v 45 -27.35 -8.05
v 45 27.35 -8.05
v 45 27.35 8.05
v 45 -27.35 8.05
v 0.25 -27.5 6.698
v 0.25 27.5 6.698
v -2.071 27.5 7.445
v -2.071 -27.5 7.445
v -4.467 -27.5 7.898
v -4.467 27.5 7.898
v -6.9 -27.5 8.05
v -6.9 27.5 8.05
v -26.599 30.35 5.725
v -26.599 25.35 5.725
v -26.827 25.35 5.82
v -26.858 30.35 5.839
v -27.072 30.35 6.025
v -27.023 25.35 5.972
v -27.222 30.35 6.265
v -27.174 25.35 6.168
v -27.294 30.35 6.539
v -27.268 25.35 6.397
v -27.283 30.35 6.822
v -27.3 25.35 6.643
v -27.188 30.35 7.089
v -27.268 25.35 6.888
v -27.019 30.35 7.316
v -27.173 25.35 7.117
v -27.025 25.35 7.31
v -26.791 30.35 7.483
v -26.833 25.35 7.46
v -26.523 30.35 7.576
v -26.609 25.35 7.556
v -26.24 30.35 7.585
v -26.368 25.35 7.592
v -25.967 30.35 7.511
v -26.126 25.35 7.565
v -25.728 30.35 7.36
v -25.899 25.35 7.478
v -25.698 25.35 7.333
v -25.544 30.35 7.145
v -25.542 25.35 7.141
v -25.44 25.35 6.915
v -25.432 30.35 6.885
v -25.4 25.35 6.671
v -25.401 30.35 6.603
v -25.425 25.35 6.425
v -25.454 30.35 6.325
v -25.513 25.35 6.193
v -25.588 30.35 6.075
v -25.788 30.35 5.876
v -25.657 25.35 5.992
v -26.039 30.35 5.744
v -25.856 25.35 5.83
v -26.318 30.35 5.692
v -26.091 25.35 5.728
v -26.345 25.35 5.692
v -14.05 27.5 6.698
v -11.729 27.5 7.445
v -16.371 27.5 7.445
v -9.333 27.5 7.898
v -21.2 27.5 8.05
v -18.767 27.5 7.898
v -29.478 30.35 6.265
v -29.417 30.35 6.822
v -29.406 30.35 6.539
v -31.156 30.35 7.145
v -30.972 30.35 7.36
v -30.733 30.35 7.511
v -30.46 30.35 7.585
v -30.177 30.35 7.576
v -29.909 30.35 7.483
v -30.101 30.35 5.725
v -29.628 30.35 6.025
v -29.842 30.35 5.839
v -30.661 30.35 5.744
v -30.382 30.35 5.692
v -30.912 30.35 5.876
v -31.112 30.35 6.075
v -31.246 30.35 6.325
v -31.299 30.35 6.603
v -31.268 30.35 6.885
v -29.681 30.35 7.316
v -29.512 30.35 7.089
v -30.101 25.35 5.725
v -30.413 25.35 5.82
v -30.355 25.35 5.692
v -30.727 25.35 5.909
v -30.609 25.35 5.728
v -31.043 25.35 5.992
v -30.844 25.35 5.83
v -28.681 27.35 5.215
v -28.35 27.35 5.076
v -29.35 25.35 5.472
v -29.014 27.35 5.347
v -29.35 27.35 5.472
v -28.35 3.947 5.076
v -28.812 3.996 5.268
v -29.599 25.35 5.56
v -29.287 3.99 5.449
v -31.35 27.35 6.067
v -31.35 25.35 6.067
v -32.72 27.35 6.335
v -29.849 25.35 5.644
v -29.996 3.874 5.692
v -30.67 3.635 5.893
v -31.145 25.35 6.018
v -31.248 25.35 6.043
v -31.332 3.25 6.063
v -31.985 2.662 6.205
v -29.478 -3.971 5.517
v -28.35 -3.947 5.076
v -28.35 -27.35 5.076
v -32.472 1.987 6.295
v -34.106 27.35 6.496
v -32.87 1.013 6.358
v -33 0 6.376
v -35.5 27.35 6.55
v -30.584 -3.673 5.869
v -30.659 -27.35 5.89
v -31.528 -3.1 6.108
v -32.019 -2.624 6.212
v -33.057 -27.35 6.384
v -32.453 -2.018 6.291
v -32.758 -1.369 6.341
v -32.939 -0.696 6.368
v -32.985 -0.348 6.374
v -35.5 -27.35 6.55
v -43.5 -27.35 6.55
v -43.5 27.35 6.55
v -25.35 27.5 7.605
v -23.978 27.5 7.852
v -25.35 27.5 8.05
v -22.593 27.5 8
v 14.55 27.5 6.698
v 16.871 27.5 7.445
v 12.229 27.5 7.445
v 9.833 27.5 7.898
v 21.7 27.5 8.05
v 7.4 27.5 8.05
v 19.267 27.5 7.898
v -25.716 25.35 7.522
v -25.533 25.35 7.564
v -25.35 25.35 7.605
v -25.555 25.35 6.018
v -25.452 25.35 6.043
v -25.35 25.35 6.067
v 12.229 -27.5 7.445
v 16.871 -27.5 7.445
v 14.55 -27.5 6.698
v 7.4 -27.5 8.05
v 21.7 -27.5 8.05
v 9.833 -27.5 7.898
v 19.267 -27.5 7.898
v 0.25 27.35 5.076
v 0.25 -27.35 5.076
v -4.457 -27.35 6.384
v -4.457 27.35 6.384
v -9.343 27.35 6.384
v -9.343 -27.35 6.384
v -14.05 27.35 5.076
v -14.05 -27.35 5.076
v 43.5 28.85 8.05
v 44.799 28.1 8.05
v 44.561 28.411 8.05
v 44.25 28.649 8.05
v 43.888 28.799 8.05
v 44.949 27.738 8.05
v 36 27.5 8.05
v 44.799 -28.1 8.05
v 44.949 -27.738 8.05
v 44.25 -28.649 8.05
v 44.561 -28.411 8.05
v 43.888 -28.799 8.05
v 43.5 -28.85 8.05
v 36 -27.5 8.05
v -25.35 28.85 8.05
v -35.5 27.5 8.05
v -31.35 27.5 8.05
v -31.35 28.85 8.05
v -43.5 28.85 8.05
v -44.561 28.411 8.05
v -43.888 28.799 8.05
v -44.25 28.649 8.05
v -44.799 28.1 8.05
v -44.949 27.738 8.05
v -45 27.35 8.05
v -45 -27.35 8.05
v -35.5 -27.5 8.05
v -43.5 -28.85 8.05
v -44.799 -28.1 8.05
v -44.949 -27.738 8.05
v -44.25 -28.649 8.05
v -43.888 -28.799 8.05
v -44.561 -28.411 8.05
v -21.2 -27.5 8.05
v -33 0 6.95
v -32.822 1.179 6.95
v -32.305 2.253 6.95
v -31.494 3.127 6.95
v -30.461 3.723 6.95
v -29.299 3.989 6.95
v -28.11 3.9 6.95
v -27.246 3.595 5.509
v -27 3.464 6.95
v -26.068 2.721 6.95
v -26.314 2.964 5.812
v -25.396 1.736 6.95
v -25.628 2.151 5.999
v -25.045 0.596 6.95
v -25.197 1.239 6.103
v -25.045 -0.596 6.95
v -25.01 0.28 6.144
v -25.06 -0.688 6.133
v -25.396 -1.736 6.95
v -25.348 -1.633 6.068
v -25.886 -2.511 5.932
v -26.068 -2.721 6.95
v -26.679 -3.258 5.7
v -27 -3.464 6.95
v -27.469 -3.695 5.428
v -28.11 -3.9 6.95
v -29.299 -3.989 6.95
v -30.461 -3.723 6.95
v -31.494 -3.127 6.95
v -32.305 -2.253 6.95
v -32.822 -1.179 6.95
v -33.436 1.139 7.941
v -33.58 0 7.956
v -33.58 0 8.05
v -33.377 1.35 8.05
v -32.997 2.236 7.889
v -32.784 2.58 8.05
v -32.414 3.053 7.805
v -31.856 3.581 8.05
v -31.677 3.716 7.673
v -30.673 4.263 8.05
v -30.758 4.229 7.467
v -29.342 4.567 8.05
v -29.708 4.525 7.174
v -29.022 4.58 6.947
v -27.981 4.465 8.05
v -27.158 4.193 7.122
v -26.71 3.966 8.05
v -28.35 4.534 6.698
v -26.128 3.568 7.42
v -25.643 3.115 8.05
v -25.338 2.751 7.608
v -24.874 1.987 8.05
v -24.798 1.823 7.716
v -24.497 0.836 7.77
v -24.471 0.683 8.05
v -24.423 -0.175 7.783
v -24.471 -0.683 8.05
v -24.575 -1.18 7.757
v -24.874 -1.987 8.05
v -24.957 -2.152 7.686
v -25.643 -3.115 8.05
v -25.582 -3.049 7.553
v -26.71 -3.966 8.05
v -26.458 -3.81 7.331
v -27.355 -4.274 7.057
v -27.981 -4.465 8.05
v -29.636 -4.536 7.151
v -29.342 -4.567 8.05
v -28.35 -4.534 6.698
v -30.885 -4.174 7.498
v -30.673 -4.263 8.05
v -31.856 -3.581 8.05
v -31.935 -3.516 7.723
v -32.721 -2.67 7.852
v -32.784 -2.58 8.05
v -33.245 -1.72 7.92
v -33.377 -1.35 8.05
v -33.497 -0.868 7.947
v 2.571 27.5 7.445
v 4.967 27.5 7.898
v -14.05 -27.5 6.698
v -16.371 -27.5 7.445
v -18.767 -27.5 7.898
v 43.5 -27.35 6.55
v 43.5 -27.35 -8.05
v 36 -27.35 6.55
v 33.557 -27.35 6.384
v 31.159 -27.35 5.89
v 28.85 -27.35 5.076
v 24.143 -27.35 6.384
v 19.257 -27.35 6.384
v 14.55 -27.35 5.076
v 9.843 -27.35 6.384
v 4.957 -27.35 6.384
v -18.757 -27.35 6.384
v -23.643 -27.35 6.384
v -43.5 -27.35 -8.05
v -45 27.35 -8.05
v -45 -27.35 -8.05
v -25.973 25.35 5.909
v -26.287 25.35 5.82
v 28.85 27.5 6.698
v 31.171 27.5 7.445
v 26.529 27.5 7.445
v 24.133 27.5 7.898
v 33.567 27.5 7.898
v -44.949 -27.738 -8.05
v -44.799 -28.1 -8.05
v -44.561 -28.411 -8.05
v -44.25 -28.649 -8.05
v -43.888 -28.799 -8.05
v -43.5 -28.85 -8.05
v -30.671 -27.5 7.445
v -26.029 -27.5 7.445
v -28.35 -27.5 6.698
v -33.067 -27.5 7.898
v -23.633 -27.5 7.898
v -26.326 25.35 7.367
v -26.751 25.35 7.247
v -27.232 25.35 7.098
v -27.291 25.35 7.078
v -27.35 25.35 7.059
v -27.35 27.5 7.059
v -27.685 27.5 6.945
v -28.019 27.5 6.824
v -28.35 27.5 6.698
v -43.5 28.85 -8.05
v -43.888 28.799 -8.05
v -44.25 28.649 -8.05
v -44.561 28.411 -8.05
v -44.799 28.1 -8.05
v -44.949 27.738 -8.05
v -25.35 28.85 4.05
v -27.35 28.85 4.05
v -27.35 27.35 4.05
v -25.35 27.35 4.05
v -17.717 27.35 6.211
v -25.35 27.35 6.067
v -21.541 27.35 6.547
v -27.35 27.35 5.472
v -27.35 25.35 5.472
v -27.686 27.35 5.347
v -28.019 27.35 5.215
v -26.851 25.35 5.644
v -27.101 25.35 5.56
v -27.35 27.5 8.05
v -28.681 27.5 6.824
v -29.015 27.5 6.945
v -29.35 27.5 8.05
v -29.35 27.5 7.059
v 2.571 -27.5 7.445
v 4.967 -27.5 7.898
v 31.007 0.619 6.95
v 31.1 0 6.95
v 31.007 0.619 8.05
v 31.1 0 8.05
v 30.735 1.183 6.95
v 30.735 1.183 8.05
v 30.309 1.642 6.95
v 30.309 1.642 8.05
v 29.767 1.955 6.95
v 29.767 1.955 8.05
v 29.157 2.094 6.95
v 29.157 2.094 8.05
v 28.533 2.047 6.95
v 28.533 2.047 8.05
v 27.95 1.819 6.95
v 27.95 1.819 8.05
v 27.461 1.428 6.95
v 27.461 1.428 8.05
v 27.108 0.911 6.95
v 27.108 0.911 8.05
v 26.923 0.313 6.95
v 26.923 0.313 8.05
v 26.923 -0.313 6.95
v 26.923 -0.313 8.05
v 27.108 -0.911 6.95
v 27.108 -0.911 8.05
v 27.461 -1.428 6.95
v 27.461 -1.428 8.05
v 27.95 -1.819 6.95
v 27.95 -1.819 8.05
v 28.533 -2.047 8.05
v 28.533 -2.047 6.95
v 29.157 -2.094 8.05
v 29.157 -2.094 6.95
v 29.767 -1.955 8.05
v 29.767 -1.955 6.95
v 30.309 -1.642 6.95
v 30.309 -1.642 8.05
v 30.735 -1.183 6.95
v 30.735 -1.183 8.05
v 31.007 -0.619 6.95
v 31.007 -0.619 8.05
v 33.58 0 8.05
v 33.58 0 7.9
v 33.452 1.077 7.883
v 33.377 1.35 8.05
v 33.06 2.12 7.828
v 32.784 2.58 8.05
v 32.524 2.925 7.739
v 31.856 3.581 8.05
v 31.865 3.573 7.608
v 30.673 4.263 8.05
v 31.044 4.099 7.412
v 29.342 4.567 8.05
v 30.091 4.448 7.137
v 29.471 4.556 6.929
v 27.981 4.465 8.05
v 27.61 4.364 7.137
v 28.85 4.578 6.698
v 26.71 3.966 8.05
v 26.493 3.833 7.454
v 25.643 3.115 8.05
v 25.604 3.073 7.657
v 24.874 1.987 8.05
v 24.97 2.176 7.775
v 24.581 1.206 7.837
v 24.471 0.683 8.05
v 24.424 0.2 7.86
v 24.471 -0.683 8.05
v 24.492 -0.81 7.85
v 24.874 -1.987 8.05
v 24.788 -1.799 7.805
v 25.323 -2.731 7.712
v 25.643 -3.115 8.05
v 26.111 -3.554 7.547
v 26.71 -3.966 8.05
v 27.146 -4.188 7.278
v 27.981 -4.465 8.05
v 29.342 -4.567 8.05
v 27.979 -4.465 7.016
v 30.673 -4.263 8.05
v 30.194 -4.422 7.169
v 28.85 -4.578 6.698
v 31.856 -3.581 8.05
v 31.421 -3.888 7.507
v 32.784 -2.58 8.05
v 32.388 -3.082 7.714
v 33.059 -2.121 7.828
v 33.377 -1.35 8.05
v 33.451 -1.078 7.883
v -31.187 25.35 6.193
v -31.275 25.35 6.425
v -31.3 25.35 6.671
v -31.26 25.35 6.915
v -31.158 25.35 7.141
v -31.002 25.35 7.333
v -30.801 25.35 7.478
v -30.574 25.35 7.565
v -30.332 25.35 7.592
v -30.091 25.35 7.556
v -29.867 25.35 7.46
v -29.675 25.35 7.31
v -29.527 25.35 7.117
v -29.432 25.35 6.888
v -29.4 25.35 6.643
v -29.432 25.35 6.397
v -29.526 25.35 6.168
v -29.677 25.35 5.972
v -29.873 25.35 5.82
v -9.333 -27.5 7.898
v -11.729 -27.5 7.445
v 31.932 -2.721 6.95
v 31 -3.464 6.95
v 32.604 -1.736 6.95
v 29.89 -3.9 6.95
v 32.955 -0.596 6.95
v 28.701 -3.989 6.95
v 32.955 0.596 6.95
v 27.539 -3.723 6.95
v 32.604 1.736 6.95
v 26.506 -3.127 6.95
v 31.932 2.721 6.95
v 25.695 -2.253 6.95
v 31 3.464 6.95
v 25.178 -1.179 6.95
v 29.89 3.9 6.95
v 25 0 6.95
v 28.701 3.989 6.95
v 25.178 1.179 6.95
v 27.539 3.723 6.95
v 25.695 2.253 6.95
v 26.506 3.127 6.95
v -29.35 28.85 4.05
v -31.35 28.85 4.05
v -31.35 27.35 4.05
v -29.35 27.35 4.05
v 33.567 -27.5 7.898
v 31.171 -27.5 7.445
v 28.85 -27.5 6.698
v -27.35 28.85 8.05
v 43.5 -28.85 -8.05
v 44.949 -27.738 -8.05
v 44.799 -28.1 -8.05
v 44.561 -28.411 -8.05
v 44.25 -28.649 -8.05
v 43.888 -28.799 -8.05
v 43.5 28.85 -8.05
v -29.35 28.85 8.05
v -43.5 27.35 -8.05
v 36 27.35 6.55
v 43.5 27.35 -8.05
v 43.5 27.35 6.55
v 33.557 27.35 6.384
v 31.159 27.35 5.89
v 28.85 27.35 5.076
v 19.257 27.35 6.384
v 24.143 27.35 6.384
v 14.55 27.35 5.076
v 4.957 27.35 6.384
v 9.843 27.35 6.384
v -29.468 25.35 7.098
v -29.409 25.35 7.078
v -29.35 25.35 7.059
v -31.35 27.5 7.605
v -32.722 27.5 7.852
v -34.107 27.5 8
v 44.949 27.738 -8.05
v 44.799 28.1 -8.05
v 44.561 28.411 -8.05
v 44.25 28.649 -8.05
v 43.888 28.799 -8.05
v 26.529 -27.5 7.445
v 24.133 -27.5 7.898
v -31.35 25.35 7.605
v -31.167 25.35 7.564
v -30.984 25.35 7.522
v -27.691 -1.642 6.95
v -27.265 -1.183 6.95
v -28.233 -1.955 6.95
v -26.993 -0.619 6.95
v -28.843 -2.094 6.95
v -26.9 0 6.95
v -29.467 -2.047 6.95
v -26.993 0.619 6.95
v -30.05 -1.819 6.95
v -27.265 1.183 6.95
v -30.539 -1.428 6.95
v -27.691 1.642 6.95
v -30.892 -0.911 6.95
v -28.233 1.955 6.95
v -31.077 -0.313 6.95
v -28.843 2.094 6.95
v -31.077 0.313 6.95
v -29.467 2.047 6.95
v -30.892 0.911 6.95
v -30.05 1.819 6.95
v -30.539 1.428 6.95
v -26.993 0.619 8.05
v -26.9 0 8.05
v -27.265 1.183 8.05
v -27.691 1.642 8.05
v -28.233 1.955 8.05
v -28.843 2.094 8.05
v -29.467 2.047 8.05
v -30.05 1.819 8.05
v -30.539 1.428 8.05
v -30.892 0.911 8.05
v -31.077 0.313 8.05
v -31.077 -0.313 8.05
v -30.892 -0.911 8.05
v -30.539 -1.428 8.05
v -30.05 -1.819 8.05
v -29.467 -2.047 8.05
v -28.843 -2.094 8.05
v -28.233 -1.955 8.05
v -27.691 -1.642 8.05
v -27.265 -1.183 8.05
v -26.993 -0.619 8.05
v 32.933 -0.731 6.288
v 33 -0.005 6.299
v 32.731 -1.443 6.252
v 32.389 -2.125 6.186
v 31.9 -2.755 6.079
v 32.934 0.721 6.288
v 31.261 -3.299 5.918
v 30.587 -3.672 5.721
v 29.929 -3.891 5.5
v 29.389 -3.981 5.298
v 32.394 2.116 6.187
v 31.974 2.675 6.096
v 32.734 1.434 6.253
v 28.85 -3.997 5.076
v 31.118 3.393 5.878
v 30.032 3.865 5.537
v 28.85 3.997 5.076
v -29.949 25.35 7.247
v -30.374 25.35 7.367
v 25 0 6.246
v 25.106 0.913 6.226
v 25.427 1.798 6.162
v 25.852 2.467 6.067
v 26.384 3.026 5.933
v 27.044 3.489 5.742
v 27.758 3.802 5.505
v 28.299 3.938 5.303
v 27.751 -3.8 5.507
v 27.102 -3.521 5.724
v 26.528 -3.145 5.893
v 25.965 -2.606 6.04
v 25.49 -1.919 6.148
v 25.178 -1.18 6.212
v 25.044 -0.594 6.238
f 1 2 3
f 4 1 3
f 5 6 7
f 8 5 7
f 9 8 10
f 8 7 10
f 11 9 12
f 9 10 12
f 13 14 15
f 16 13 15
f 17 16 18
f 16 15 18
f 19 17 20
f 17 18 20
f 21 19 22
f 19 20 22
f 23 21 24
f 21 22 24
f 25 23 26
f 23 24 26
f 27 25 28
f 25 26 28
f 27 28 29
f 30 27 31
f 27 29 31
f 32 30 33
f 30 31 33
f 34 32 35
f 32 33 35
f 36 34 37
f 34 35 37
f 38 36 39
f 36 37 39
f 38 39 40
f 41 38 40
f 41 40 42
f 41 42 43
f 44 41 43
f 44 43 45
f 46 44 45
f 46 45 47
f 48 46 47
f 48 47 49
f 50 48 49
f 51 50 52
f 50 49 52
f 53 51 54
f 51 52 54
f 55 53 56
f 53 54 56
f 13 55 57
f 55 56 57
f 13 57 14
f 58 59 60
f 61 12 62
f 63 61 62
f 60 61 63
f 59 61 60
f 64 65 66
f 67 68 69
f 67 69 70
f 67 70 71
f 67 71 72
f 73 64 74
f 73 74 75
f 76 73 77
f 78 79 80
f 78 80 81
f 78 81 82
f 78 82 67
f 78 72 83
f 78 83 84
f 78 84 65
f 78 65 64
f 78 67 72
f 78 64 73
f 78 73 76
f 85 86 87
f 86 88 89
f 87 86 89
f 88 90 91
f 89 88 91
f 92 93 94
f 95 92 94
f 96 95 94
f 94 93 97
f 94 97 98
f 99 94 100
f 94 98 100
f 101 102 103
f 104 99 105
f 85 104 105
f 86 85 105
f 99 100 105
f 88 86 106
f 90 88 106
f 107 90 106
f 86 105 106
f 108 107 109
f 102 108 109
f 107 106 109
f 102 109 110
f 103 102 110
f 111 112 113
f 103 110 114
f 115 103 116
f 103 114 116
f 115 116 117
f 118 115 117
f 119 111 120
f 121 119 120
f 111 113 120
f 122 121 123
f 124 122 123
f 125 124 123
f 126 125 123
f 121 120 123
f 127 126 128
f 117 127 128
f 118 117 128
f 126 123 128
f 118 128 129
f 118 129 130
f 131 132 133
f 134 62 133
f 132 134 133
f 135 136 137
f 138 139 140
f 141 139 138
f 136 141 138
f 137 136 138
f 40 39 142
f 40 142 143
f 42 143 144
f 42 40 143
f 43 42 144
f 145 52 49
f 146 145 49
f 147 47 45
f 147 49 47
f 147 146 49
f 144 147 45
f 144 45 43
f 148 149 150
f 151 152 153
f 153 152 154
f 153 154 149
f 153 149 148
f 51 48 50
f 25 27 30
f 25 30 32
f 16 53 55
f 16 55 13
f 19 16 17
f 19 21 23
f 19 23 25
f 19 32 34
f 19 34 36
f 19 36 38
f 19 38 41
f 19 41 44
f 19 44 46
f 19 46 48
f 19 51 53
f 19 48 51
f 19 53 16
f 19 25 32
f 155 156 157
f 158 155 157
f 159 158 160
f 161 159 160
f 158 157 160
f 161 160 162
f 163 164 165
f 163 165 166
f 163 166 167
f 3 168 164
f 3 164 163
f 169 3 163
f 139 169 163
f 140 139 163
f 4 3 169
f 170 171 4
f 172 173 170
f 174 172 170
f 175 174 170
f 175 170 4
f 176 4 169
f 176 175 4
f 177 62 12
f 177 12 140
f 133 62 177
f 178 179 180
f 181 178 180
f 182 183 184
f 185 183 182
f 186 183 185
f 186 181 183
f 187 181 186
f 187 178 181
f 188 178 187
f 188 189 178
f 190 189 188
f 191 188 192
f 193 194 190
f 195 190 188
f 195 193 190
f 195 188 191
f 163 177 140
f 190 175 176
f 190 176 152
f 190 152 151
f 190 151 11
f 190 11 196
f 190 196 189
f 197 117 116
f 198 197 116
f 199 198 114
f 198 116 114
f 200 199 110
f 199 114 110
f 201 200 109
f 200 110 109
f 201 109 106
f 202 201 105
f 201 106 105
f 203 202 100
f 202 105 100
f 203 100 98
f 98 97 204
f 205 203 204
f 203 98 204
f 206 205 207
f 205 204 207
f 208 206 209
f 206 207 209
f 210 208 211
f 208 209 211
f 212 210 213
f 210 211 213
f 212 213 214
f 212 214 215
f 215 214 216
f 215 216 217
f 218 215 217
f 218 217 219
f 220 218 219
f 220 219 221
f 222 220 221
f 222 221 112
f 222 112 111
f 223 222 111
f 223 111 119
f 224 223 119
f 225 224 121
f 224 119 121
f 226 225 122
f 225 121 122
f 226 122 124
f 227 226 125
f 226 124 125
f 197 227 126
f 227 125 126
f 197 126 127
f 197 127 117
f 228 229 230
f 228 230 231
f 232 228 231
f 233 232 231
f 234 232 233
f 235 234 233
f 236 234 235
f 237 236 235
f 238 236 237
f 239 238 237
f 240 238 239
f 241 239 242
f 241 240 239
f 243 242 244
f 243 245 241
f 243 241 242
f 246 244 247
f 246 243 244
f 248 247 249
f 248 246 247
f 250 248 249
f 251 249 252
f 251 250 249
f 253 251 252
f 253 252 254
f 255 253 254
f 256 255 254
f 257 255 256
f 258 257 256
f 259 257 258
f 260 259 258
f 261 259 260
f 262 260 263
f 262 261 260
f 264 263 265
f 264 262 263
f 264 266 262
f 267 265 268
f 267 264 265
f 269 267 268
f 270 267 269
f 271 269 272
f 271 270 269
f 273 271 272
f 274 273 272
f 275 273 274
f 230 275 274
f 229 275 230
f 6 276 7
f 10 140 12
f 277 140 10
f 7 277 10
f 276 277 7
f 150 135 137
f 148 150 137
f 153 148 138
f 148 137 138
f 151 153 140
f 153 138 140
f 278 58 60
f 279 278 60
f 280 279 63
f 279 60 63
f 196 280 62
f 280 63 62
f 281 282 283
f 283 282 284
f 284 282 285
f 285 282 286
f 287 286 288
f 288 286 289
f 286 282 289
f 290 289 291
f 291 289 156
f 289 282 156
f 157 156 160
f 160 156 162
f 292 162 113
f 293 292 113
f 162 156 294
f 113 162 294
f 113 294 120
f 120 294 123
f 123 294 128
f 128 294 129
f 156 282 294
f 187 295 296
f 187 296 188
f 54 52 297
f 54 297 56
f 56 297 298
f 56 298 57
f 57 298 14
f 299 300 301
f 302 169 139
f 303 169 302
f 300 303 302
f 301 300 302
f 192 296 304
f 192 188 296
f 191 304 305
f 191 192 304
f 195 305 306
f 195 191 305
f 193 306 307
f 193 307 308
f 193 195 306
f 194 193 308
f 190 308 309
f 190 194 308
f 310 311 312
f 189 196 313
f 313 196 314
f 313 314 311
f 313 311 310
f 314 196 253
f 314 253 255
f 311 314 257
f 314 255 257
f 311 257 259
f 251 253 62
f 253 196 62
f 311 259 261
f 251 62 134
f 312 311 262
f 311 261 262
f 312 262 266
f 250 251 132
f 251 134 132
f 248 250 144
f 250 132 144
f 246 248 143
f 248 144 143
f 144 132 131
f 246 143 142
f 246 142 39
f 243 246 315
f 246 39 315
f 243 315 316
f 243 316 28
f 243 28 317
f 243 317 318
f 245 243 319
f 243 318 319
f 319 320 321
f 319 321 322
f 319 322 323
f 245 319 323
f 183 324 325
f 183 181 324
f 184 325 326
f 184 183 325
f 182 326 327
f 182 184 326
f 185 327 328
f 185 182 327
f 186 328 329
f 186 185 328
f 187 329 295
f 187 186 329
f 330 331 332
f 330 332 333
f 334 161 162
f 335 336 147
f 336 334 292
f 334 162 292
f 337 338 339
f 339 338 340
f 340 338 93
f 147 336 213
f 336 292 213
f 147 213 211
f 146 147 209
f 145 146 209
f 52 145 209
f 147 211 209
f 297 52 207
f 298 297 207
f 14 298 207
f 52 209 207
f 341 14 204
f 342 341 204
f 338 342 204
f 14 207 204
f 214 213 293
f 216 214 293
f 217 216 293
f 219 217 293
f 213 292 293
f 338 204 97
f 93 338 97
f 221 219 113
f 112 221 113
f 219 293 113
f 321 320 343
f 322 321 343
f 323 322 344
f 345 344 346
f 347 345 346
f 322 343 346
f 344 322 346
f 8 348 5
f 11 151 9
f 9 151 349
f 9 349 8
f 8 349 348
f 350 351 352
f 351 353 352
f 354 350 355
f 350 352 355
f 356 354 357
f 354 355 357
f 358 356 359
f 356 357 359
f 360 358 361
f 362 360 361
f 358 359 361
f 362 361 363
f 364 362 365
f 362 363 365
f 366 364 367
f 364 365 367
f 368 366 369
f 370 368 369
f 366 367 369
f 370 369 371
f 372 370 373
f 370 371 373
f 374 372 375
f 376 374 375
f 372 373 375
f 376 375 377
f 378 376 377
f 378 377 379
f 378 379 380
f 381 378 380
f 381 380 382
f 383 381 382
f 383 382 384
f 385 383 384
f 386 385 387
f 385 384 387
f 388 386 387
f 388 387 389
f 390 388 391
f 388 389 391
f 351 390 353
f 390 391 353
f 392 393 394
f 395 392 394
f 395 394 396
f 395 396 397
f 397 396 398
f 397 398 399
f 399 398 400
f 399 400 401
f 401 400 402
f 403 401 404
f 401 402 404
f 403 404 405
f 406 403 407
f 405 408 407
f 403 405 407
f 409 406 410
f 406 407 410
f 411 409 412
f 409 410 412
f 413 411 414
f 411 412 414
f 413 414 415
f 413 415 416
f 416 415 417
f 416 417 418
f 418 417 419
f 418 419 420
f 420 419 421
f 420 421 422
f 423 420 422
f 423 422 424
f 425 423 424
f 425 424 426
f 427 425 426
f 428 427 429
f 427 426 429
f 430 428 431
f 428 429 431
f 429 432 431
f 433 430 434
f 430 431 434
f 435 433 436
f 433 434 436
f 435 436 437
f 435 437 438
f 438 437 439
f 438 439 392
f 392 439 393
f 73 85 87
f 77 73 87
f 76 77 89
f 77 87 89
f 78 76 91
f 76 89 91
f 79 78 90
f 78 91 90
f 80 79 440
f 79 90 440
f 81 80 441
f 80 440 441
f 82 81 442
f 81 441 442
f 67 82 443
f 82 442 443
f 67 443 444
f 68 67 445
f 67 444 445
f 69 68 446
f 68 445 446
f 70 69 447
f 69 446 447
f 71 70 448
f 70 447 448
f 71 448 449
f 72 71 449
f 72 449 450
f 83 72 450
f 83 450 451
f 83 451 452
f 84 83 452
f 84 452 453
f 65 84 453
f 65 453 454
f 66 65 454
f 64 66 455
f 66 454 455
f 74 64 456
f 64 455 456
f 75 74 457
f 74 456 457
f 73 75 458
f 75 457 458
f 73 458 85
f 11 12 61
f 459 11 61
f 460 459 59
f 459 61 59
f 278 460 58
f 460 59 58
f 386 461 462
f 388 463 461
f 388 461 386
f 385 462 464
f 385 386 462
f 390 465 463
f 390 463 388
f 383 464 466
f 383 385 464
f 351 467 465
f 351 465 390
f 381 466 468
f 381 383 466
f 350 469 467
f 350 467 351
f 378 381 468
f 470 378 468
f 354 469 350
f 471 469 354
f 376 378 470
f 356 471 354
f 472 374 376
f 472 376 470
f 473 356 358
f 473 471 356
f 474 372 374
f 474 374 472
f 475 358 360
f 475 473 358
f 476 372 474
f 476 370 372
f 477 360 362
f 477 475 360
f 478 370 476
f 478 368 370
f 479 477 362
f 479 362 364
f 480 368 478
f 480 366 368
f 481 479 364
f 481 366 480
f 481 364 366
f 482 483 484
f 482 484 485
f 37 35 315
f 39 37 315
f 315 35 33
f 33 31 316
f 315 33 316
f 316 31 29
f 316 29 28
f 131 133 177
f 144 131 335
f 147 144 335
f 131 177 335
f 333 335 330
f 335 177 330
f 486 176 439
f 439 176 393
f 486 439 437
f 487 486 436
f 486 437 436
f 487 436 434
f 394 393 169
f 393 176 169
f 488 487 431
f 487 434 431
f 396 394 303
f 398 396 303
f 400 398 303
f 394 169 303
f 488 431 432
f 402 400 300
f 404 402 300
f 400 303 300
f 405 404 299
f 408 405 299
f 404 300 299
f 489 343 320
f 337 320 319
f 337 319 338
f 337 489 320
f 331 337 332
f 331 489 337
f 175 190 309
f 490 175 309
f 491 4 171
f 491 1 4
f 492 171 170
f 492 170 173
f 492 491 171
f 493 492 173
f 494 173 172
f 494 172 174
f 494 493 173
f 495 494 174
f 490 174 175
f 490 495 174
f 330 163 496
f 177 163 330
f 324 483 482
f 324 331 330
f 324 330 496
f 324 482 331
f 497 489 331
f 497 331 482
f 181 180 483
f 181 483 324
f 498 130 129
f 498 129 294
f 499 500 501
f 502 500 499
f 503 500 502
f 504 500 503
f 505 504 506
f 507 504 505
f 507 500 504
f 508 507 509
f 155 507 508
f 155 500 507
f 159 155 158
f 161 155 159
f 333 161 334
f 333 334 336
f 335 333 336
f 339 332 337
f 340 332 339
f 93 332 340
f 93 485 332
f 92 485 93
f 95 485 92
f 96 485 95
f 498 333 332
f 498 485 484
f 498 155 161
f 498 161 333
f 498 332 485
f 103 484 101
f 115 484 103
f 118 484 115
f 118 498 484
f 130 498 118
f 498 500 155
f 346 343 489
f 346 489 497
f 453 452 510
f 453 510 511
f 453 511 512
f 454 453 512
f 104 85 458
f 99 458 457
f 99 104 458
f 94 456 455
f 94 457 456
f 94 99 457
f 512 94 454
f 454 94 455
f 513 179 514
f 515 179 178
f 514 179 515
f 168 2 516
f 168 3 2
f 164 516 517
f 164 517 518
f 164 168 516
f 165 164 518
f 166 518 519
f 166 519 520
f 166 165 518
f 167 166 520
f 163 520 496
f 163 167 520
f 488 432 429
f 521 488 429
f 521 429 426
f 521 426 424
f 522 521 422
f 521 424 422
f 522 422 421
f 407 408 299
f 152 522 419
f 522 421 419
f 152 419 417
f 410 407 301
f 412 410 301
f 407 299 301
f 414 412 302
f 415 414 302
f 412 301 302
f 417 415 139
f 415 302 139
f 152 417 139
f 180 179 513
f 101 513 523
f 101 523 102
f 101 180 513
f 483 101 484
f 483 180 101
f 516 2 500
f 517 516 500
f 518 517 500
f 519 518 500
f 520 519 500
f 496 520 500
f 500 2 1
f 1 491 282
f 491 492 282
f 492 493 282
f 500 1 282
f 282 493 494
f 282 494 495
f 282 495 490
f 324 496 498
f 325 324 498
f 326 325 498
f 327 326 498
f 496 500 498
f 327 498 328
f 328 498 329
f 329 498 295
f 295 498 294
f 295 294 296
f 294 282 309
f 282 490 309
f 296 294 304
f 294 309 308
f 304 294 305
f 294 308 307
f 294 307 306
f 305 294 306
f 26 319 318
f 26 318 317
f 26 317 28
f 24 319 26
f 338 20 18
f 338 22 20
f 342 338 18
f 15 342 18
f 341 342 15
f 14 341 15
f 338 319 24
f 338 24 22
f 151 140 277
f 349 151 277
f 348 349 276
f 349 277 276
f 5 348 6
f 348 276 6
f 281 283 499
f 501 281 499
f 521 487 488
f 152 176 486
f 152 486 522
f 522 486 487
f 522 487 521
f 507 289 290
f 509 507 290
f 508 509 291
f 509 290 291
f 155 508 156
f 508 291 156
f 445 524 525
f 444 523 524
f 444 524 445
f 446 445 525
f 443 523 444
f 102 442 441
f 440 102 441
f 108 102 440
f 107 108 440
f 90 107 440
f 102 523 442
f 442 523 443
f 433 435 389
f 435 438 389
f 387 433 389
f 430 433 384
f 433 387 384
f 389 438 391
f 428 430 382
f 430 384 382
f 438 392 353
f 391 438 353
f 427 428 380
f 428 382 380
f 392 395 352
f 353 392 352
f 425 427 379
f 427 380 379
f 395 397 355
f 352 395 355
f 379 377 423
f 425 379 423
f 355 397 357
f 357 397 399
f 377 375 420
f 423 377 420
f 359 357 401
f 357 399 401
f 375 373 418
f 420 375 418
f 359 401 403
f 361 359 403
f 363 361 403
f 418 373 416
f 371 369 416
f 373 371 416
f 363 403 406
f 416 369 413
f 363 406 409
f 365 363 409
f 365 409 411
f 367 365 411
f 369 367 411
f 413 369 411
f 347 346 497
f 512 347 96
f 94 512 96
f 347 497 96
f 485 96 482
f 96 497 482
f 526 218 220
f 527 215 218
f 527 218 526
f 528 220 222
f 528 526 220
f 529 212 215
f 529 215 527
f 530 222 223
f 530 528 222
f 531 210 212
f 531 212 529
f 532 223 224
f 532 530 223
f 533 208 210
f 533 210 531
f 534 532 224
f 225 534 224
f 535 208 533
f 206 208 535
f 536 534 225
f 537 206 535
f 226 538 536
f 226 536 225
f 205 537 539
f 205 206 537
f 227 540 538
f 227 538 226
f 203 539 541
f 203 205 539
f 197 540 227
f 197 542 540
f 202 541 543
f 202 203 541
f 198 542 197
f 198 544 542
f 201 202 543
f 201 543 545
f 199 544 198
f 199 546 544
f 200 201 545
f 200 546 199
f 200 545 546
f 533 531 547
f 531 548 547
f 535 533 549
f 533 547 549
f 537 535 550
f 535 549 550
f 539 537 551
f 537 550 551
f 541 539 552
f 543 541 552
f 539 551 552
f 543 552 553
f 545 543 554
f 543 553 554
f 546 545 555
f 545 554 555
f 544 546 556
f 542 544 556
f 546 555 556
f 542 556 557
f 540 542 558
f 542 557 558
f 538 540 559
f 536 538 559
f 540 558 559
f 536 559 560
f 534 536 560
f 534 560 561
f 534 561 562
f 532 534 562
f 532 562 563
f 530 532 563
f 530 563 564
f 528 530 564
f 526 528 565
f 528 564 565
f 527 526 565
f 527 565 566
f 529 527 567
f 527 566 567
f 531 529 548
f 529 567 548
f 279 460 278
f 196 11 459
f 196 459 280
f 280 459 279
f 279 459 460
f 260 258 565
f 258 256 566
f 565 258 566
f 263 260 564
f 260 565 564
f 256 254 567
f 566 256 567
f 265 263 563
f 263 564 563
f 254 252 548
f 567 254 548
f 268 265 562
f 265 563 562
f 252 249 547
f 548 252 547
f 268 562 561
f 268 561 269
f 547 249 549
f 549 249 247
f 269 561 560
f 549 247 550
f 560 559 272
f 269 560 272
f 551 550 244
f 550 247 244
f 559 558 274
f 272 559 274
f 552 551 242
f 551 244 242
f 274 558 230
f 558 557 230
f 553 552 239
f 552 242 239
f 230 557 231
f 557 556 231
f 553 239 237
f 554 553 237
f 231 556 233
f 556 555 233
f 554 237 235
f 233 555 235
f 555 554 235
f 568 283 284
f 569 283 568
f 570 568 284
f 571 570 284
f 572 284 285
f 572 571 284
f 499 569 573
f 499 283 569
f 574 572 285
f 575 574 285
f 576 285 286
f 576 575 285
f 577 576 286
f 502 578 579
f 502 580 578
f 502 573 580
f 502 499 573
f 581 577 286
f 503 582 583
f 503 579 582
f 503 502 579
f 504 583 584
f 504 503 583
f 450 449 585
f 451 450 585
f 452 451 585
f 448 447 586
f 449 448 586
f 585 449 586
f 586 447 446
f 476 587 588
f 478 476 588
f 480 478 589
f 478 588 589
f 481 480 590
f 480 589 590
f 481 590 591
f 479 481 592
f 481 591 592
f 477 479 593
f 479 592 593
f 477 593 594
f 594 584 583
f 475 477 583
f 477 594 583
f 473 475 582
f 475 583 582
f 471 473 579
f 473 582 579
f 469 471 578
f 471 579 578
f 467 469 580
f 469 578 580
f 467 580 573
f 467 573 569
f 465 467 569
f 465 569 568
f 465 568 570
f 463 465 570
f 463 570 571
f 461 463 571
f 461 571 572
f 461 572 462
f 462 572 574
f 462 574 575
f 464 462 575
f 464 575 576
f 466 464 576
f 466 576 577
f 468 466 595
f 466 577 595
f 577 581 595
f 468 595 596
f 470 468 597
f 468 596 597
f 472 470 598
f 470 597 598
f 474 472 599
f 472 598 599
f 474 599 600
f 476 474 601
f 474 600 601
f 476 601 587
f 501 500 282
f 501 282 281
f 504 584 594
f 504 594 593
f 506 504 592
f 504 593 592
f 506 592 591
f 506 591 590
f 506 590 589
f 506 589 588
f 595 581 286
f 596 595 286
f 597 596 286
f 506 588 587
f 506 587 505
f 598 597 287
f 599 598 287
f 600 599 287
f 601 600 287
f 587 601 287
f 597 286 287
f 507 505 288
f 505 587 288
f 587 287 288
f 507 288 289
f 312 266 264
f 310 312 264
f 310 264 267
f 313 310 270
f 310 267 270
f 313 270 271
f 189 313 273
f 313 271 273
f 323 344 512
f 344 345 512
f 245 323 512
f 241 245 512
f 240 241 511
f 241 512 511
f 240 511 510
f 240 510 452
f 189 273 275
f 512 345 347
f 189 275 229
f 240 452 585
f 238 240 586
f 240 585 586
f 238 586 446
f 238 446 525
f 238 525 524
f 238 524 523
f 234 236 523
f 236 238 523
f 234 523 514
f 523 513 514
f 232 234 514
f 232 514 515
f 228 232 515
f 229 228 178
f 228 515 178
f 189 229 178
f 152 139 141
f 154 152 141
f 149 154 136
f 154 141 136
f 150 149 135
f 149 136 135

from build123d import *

# Parameters (mm, degrees)
EXTRUDE_1_DEPTH                = 54.7
SKETCH_2_W                     = 1.5
SKETCH_2_H                     = 1.473886678
EXTRUDE_2_DEPTH                = 7.15
SKETCH_3_W                     = 0.15
SKETCH_3_H                     = 1.473886678
EXTRUDE_3_DEPTH                = 7.15
SKETCH_4_W                     = 7.15
SKETCH_4_H                     = 56.35
EXTRUDE_4_DEPTH                = 1.5
SKETCH_5_W                     = 2.973886678
SKETCH_5_H                     = 56.35
EXTRUDE_5_DEPTH                = 14.3
CUT_EXTRUDE_1_DEPTH            = 54.7
SKETCH_7_W                     = 2.973886678
SKETCH_7_H                     = 56.35
EXTRUDE_6_DEPTH                = 14.3
CUT_EXTRUDE_2_DEPTH            = 54.7
SKETCH_9_W                     = 2.973886678
SKETCH_9_H                     = 56.35
EXTRUDE_7_DEPTH                = 14.3
CUT_EXTRUDE_3_DEPTH            = 54.7
SKETCH_11_W                    = 2.973886678
SKETCH_11_H                    = 56.35
EXTRUDE_8_DEPTH                = 14.3
CUT_EXTRUDE_4_DEPTH            = 54.7
EXTRUDE_9_DEPTH                = 7.15
CUT_EXTRUDE_5_DEPTH            = 54.7
CUT_EXTRUDE_6_DEPTH            = 55
CUT_EXTRUDE_7_DEPTH            = 55
CUT_EXTRUDE_8_DEPTH            = 55
CUT_EXTRUDE_9_DEPTH            = 55
CUT_EXTRUDE_10_DEPTH           = 55
SKETCH_20_W                    = 71.5
SKETCH_20_H                    = 1.5
EXTRUDE_10_DEPTH               = 13.126113322
SKETCH_21_W                    = 71.5
SKETCH_21_H                    = 0.15
EXTRUDE_11_DEPTH               = 13.126113322
SKETCH_22_W                    = 16.1
SKETCH_22_H                    = 56.35
EXTRUDE_12_DEPTH               = 9.5
SKETCH_23_W                    = 16.1
SKETCH_23_H                    = 56.35
EXTRUDE_13_DEPTH               = 9
SKETCH_24_W                    = 14.6
SKETCH_24_H                    = 54.7
CUT_EXTRUDE_11_DEPTH           = 8
SKETCH_25_W                    = 14.6
SKETCH_25_H                    = 54.7
CUT_EXTRUDE_12_DEPTH           = 7.5
SKETCH_26_W                    = 90
SKETCH_26_H                    = 16.1
EXTRUDE_14_DEPTH               = 1.35
SKETCH_27_W                    = 4.58
SKETCH_27_H                    = 1.352189545
SKETCH_28_W                    = 4.58
SKETCH_28_H                    = 1.352189545
HOLE_WIZARD_M3_5_1_D           = 4.2
HOLE_WIZARD_M3_5_1_CBORE_D     = 8
HOLE_WIZARD_M3_5_1_CBORE_DEPTH = 1.873886678
FILLET_1_R                     = 1.5
SKETCH_32_W                    = 2
SKETCH_32_H                    = 4
CUT_EXTRUDE_13_DEPTH           = 3.5
SKETCH_35_R                    = 0.95
EXTRUDE_15_DEPTH               = 5


with BuildPart() as part:
    # 草图1 → 凸台-拉伸1 (new body)
    with BuildSketch(Plane(origin=(0, 27.35, 0), x_dir=(1, 0, 0), z_dir=(0, 1, 0))):
        with BuildLine():
            Line((28.85, -5.076113322), (28.85, -6.55))
            Line((28.85, -6.55), (36, -6.55))
            ThreePointArc((36, -6.55), (32.349834184, -6.177694996), (28.85, -5.076113322))
        make_face()
    extrude(amount=-EXTRUDE_1_DEPTH)

    # 草图2 → 凸台-拉伸2 (add)
    with BuildSketch(Plane(origin=(28.85, 0, 0), x_dir=(0, -1, 0), z_dir=(-1, 0, 0))):
        with Locations((28.1, 5.813056661)):
            Rectangle(SKETCH_2_W, SKETCH_2_H)
    extrude(amount=-EXTRUDE_2_DEPTH)

    # 草图3 → 凸台-拉伸3 (add)
    with BuildSketch(Plane(origin=(28.85, 0, 0), x_dir=(0, -1, 0), z_dir=(-1, 0, 0))):
        with Locations((-27.425, 5.813056661)):
            Rectangle(SKETCH_3_W, SKETCH_3_H)
    extrude(amount=-EXTRUDE_3_DEPTH)

    # 草图4 → 凸台-拉伸4 (add)
    with BuildSketch(Plane.XY.offset(6.55)):
        with Locations((32.425, -0.675)):
            Rectangle(SKETCH_4_W, SKETCH_4_H)
    extrude(amount=EXTRUDE_4_DEPTH)

    # 草图5 → 凸台-拉伸5 (add)
    with BuildSketch(Plane.ZY.offset(-28.85)):
        with Locations((6.563056661, -0.675)):
            Rectangle(SKETCH_5_W, SKETCH_5_H)
    extrude(amount=EXTRUDE_5_DEPTH)

    # 草图6 → 切除-拉伸1 (cut)
    with BuildSketch(Plane.XZ.offset(27.35)):
        with BuildLine():
            Line((14.55, 5.076113322), (28.85, 5.076113322))
            ThreePointArc((28.85, 5.076113322), (21.7, 6.55), (14.55, 5.076113322))
        make_face()
    extrude(amount=-CUT_EXTRUDE_1_DEPTH, mode=Mode.SUBTRACT)

    # 草图7 → 凸台-拉伸6 (add)
    with BuildSketch(Plane.ZY.offset(-14.55)):
        with Locations((6.563056661, -0.675)):
            Rectangle(SKETCH_7_W, SKETCH_7_H)
    extrude(amount=EXTRUDE_6_DEPTH)

    # 草图8 → 切除-拉伸2 (cut)
    with BuildSketch(Plane.XZ.offset(27.35)):
        with BuildLine():
            Line((0.25, 5.076113322), (14.55, 5.076113322))
            ThreePointArc((14.55, 5.076113322), (7.4, 6.55), (0.25, 5.076113322))
        make_face()
    extrude(amount=-CUT_EXTRUDE_2_DEPTH, mode=Mode.SUBTRACT)

    # 草图9 → 凸台-拉伸7 (add)
    with BuildSketch(Plane.ZY.offset(-0.25)):
        with Locations((6.563056661, -0.675)):
            Rectangle(SKETCH_9_W, SKETCH_9_H)
    extrude(amount=EXTRUDE_7_DEPTH)

    # 草图10 → 切除-拉伸3 (cut)
    with BuildSketch(Plane.XZ.offset(27.35)):
        with BuildLine():
            Line((-14.05, 5.076113322), (0.25, 5.076113322))
            ThreePointArc((0.25, 5.076113322), (-6.9, 6.55), (-14.05, 5.076113322))
        make_face()
    extrude(amount=-CUT_EXTRUDE_3_DEPTH, mode=Mode.SUBTRACT)

    # 草图11 → 凸台-拉伸8 (add)
    with BuildSketch(Plane.ZY.offset(14.05)):
        with Locations((6.563056661, -0.675)):
            Rectangle(SKETCH_11_W, SKETCH_11_H)
    extrude(amount=EXTRUDE_8_DEPTH)

    # 草图12 → 切除-拉伸4 (cut)
    with BuildSketch(Plane.XZ.offset(27.35)):
        with BuildLine():
            Line((-28.35, 5.076113322), (-14.05, 5.076113322))
            ThreePointArc((-14.05, 5.076113322), (-21.2, 6.55), (-28.35, 5.076113322))
        make_face()
    extrude(amount=-CUT_EXTRUDE_4_DEPTH, mode=Mode.SUBTRACT)

    # 草图13 → 凸台-拉伸9 (add)
    with BuildSketch(Plane.ZY.offset(28.35)):
        with BuildLine():
            Line((5.076113322, 27.35), (5.076113322, 27.5))
            Line((5.076113322, 27.5), (8.05, 27.5))
            Line((8.05, 27.5), (8.05, -28.85))
            Line((8.05, -28.85), (5.076113322, -28.85))
            Line((5.076113322, -28.85), (5.076113322, -27.35))
            add(Edge.make_bspline(
                [(5.076113322, -27.35), (5.076113322, -9.116666667), (5.076113322, 9.116666667), (5.076113322, 27.35)],
                knots=[0, 0, 0, 0, 1, 1, 1, 1], degree=3))
        make_face()
    extrude(amount=EXTRUDE_9_DEPTH)

    # 草图14 → 切除-拉伸5 (cut)
    with BuildSketch(Plane.XZ.offset(27.35)):
        with BuildLine():
            Line((-35.5, 5.076113322), (-28.35, 5.076113322))
            ThreePointArc((-28.35, 5.076113322), (-31.849834184, 6.177694996), (-35.5, 6.55))
            Line((-35.5, 6.55), (-35.5, 5.076113322))
        make_face()
    extrude(amount=-CUT_EXTRUDE_5_DEPTH, mode=Mode.SUBTRACT)

    # 草图15 → 切除-拉伸6 (cut)
    with BuildSketch(Plane(origin=(0, 27.5, 0), x_dir=(-1, 0, 0), z_dir=(0, 1, 0))):
        with BuildLine():
            Line((21.2, 8.05), (6.9, 8.05))
            ThreePointArc((6.9, 8.05), (10.538369022, 7.708982887), (14.05, 6.697810455))
            ThreePointArc((14.05, 6.697810455), (17.561630978, 7.708982887), (21.2, 8.05))
        make_face()
    extrude(amount=-CUT_EXTRUDE_6_DEPTH, mode=Mode.SUBTRACT)

    # 草图16 → 切除-拉伸7 (cut)
    with BuildSketch(Plane(origin=(0, 27.5, 0), x_dir=(-1, 0, 0), z_dir=(0, 1, 0))):
        with BuildLine():
            Line((6.9, 8.05), (-7.4, 8.05))
            ThreePointArc((-7.4, 8.05), (-3.761630978, 7.708982887), (-0.25, 6.697810455))
            ThreePointArc((-0.25, 6.697810455), (3.261630978, 7.708982887), (6.9, 8.05))
        make_face()
    extrude(amount=-CUT_EXTRUDE_7_DEPTH, mode=Mode.SUBTRACT)

    # 草图17 → 切除-拉伸8 (cut)
    with BuildSketch(Plane(origin=(0, 27.5, 0), x_dir=(-1, 0, 0), z_dir=(0, 1, 0))):
        with BuildLine():
            Line((-7.4, 8.05), (-21.7, 8.05))
            ThreePointArc((-21.7, 8.05), (-18.061630978, 7.708982887), (-14.55, 6.697810455))
            ThreePointArc((-14.55, 6.697810455), (-11.038369022, 7.708982887), (-7.4, 8.05))
        make_face()
    extrude(amount=-CUT_EXTRUDE_8_DEPTH, mode=Mode.SUBTRACT)

    # 草图18 → 切除-拉伸9 (cut)
    with BuildSketch(Plane(origin=(0, 27.5, 0), x_dir=(-1, 0, 0), z_dir=(0, 1, 0))):
        with BuildLine():
            Line((-21.7, 8.05), (-36, 8.05))
            ThreePointArc((-36, 8.05), (-32.361630978, 7.708982887), (-28.85, 6.697810455))
            ThreePointArc((-28.85, 6.697810455), (-25.338369022, 7.708982887), (-21.7, 8.05))
        make_face()
    extrude(amount=-CUT_EXTRUDE_9_DEPTH, mode=Mode.SUBTRACT)

    # 草图19 → 切除-拉伸10 (cut)
    with BuildSketch(Plane(origin=(0, 27.5, 0), x_dir=(-1, 0, 0), z_dir=(0, 1, 0))):
        with BuildLine():
            Line((35.5, 8.05), (21.2, 8.05))
            ThreePointArc((21.2, 8.05), (24.838369022, 7.708982887), (28.35, 6.697810455))
            ThreePointArc((28.35, 6.697810455), (31.861630978, 7.708982887), (35.5, 8.05))
        make_face()
    extrude(amount=-CUT_EXTRUDE_10_DEPTH, mode=Mode.SUBTRACT)

    # 草图20 → 凸台-拉伸10 (add)
    with BuildSketch(Plane(origin=(0, 0, 5.076113322), x_dir=(-1, 0, 0), z_dir=(0, 0, -1))):
        with Locations((-0.25, -28.1)):
            Rectangle(SKETCH_20_W, SKETCH_20_H)
    extrude(amount=EXTRUDE_10_DEPTH)

    # 草图21 → 凸台-拉伸11 (add)
    with BuildSketch(Plane(origin=(0, 0, 5.076113322), x_dir=(-1, 0, 0), z_dir=(0, 0, -1))):
        with Locations((-0.25, 27.425)):
            Rectangle(SKETCH_21_W, SKETCH_21_H)
    extrude(amount=EXTRUDE_11_DEPTH)

    # 草图22 → 凸台-拉伸12 (add)
    with BuildSketch(Plane.ZY.offset(35.5)):
        with Locations((0, -0.675)):
            Rectangle(SKETCH_22_W, SKETCH_22_H)
    extrude(amount=EXTRUDE_12_DEPTH)

    # 草图23 → 凸台-拉伸13 (add)
    with BuildSketch(Plane(origin=(36, 0, 0), x_dir=(0, 0, -1), z_dir=(1, 0, 0))):
        with Locations((0, -0.675)):
            Rectangle(SKETCH_23_W, SKETCH_23_H)
    extrude(amount=EXTRUDE_13_DEPTH)

    # 草图24 → 切除-拉伸11 (cut)
    with BuildSketch(Plane(origin=(-35.5, 0, 0), x_dir=(0, 0, -1), z_dir=(1, 0, 0))):
        with Locations((0.75, 0)):
            Rectangle(SKETCH_24_W, SKETCH_24_H)
    extrude(amount=-CUT_EXTRUDE_11_DEPTH, mode=Mode.SUBTRACT)

    # 草图25 → 切除-拉伸12 (cut)
    with BuildSketch(Plane.ZY.offset(-36)):
        with Locations((-0.75, 0)):
            Rectangle(SKETCH_25_W, SKETCH_25_H)
    extrude(amount=-CUT_EXTRUDE_12_DEPTH, mode=Mode.SUBTRACT)

    # 草图26 → 凸台-拉伸14 (add)
    with BuildSketch(Plane(origin=(0, 27.5, 0), x_dir=(-1, 0, 0), z_dir=(0, 1, 0))):
        Rectangle(SKETCH_26_W, SKETCH_26_H)
    extrude(amount=EXTRUDE_14_DEPTH)

    # 草图27 → 旋转1 (revolve)
    with BuildSketch(Plane(origin=(0, 0, 0), x_dir=(1, 0, 0), z_dir=(0, 1, 0))):
        with Locations((-31.29, -7.373905228)):
            Rectangle(SKETCH_27_W, SKETCH_27_H)
    revolve(axis=Axis((-29, 0, 8.05), (0, 0, -1)))

    # 草图28 → 旋转2 (revolve)
    with BuildSketch(Plane(origin=(0, 0, 0), x_dir=(1, 0, 0), z_dir=(0, 1, 0))):
        with Locations((31.29, -7.373905228)):
            Rectangle(SKETCH_28_W, SKETCH_28_H)
    revolve(axis=Axis((29, 0, 6.697810455), (0, 0, 1)))

    # M3.5 六角头机械螺钉的柱形沉头孔1 (through all)
    with Locations(Plane(origin=(0, 0, 5.076113322), x_dir=(-1, 0, 0), z_dir=(0, 0, -1))):
        with Locations((-29, 0), (29, 0)):
            CounterBoreHole(HOLE_WIZARD_M3_5_1_D / 2, HOLE_WIZARD_M3_5_1_CBORE_D / 2, HOLE_WIZARD_M3_5_1_CBORE_DEPTH)

    # 圆角1
    fillet_1_edges = [part.edges().sort_by_distance(p)[0] for p in [
        (-45, -28.85, 0),
        (45, -28.85, 0),
        (45, 28.85, 0),
        (-45, 28.85, 0),
    ]]
    fillet(fillet_1_edges, radius=FILLET_1_R)

    # 草图32 → 切除-拉伸13 (cut)
    with BuildSketch(Plane(origin=(0, 28.85, 0), x_dir=(1, 0, 0), z_dir=(0, 1, 0))):
        with Locations((-30.35, -6.05)):
            Rectangle(SKETCH_32_W, SKETCH_32_H)
        with Locations((-26.35, -6.05)):
            Rectangle(SKETCH_32_W, SKETCH_32_H)
    extrude(amount=-CUT_EXTRUDE_13_DEPTH, mode=Mode.SUBTRACT)

    # 草图35 → 凸台-拉伸15 (add)
    with BuildSketch(Plane(origin=(0, 25.35, 0), x_dir=(1, 0, 0), z_dir=(0, 1, 0))):
        with Locations(Location((-30.35, -6.641832766, 0), (0, 0, 74.804666508))):
            Circle(SKETCH_35_R)
        with Locations(Location((-26.35, -6.641832766, 0), (0, 0, 105.195333492))):
            Circle(SKETCH_35_R)
    extrude(amount=EXTRUDE_15_DEPTH)


solid = part.part
